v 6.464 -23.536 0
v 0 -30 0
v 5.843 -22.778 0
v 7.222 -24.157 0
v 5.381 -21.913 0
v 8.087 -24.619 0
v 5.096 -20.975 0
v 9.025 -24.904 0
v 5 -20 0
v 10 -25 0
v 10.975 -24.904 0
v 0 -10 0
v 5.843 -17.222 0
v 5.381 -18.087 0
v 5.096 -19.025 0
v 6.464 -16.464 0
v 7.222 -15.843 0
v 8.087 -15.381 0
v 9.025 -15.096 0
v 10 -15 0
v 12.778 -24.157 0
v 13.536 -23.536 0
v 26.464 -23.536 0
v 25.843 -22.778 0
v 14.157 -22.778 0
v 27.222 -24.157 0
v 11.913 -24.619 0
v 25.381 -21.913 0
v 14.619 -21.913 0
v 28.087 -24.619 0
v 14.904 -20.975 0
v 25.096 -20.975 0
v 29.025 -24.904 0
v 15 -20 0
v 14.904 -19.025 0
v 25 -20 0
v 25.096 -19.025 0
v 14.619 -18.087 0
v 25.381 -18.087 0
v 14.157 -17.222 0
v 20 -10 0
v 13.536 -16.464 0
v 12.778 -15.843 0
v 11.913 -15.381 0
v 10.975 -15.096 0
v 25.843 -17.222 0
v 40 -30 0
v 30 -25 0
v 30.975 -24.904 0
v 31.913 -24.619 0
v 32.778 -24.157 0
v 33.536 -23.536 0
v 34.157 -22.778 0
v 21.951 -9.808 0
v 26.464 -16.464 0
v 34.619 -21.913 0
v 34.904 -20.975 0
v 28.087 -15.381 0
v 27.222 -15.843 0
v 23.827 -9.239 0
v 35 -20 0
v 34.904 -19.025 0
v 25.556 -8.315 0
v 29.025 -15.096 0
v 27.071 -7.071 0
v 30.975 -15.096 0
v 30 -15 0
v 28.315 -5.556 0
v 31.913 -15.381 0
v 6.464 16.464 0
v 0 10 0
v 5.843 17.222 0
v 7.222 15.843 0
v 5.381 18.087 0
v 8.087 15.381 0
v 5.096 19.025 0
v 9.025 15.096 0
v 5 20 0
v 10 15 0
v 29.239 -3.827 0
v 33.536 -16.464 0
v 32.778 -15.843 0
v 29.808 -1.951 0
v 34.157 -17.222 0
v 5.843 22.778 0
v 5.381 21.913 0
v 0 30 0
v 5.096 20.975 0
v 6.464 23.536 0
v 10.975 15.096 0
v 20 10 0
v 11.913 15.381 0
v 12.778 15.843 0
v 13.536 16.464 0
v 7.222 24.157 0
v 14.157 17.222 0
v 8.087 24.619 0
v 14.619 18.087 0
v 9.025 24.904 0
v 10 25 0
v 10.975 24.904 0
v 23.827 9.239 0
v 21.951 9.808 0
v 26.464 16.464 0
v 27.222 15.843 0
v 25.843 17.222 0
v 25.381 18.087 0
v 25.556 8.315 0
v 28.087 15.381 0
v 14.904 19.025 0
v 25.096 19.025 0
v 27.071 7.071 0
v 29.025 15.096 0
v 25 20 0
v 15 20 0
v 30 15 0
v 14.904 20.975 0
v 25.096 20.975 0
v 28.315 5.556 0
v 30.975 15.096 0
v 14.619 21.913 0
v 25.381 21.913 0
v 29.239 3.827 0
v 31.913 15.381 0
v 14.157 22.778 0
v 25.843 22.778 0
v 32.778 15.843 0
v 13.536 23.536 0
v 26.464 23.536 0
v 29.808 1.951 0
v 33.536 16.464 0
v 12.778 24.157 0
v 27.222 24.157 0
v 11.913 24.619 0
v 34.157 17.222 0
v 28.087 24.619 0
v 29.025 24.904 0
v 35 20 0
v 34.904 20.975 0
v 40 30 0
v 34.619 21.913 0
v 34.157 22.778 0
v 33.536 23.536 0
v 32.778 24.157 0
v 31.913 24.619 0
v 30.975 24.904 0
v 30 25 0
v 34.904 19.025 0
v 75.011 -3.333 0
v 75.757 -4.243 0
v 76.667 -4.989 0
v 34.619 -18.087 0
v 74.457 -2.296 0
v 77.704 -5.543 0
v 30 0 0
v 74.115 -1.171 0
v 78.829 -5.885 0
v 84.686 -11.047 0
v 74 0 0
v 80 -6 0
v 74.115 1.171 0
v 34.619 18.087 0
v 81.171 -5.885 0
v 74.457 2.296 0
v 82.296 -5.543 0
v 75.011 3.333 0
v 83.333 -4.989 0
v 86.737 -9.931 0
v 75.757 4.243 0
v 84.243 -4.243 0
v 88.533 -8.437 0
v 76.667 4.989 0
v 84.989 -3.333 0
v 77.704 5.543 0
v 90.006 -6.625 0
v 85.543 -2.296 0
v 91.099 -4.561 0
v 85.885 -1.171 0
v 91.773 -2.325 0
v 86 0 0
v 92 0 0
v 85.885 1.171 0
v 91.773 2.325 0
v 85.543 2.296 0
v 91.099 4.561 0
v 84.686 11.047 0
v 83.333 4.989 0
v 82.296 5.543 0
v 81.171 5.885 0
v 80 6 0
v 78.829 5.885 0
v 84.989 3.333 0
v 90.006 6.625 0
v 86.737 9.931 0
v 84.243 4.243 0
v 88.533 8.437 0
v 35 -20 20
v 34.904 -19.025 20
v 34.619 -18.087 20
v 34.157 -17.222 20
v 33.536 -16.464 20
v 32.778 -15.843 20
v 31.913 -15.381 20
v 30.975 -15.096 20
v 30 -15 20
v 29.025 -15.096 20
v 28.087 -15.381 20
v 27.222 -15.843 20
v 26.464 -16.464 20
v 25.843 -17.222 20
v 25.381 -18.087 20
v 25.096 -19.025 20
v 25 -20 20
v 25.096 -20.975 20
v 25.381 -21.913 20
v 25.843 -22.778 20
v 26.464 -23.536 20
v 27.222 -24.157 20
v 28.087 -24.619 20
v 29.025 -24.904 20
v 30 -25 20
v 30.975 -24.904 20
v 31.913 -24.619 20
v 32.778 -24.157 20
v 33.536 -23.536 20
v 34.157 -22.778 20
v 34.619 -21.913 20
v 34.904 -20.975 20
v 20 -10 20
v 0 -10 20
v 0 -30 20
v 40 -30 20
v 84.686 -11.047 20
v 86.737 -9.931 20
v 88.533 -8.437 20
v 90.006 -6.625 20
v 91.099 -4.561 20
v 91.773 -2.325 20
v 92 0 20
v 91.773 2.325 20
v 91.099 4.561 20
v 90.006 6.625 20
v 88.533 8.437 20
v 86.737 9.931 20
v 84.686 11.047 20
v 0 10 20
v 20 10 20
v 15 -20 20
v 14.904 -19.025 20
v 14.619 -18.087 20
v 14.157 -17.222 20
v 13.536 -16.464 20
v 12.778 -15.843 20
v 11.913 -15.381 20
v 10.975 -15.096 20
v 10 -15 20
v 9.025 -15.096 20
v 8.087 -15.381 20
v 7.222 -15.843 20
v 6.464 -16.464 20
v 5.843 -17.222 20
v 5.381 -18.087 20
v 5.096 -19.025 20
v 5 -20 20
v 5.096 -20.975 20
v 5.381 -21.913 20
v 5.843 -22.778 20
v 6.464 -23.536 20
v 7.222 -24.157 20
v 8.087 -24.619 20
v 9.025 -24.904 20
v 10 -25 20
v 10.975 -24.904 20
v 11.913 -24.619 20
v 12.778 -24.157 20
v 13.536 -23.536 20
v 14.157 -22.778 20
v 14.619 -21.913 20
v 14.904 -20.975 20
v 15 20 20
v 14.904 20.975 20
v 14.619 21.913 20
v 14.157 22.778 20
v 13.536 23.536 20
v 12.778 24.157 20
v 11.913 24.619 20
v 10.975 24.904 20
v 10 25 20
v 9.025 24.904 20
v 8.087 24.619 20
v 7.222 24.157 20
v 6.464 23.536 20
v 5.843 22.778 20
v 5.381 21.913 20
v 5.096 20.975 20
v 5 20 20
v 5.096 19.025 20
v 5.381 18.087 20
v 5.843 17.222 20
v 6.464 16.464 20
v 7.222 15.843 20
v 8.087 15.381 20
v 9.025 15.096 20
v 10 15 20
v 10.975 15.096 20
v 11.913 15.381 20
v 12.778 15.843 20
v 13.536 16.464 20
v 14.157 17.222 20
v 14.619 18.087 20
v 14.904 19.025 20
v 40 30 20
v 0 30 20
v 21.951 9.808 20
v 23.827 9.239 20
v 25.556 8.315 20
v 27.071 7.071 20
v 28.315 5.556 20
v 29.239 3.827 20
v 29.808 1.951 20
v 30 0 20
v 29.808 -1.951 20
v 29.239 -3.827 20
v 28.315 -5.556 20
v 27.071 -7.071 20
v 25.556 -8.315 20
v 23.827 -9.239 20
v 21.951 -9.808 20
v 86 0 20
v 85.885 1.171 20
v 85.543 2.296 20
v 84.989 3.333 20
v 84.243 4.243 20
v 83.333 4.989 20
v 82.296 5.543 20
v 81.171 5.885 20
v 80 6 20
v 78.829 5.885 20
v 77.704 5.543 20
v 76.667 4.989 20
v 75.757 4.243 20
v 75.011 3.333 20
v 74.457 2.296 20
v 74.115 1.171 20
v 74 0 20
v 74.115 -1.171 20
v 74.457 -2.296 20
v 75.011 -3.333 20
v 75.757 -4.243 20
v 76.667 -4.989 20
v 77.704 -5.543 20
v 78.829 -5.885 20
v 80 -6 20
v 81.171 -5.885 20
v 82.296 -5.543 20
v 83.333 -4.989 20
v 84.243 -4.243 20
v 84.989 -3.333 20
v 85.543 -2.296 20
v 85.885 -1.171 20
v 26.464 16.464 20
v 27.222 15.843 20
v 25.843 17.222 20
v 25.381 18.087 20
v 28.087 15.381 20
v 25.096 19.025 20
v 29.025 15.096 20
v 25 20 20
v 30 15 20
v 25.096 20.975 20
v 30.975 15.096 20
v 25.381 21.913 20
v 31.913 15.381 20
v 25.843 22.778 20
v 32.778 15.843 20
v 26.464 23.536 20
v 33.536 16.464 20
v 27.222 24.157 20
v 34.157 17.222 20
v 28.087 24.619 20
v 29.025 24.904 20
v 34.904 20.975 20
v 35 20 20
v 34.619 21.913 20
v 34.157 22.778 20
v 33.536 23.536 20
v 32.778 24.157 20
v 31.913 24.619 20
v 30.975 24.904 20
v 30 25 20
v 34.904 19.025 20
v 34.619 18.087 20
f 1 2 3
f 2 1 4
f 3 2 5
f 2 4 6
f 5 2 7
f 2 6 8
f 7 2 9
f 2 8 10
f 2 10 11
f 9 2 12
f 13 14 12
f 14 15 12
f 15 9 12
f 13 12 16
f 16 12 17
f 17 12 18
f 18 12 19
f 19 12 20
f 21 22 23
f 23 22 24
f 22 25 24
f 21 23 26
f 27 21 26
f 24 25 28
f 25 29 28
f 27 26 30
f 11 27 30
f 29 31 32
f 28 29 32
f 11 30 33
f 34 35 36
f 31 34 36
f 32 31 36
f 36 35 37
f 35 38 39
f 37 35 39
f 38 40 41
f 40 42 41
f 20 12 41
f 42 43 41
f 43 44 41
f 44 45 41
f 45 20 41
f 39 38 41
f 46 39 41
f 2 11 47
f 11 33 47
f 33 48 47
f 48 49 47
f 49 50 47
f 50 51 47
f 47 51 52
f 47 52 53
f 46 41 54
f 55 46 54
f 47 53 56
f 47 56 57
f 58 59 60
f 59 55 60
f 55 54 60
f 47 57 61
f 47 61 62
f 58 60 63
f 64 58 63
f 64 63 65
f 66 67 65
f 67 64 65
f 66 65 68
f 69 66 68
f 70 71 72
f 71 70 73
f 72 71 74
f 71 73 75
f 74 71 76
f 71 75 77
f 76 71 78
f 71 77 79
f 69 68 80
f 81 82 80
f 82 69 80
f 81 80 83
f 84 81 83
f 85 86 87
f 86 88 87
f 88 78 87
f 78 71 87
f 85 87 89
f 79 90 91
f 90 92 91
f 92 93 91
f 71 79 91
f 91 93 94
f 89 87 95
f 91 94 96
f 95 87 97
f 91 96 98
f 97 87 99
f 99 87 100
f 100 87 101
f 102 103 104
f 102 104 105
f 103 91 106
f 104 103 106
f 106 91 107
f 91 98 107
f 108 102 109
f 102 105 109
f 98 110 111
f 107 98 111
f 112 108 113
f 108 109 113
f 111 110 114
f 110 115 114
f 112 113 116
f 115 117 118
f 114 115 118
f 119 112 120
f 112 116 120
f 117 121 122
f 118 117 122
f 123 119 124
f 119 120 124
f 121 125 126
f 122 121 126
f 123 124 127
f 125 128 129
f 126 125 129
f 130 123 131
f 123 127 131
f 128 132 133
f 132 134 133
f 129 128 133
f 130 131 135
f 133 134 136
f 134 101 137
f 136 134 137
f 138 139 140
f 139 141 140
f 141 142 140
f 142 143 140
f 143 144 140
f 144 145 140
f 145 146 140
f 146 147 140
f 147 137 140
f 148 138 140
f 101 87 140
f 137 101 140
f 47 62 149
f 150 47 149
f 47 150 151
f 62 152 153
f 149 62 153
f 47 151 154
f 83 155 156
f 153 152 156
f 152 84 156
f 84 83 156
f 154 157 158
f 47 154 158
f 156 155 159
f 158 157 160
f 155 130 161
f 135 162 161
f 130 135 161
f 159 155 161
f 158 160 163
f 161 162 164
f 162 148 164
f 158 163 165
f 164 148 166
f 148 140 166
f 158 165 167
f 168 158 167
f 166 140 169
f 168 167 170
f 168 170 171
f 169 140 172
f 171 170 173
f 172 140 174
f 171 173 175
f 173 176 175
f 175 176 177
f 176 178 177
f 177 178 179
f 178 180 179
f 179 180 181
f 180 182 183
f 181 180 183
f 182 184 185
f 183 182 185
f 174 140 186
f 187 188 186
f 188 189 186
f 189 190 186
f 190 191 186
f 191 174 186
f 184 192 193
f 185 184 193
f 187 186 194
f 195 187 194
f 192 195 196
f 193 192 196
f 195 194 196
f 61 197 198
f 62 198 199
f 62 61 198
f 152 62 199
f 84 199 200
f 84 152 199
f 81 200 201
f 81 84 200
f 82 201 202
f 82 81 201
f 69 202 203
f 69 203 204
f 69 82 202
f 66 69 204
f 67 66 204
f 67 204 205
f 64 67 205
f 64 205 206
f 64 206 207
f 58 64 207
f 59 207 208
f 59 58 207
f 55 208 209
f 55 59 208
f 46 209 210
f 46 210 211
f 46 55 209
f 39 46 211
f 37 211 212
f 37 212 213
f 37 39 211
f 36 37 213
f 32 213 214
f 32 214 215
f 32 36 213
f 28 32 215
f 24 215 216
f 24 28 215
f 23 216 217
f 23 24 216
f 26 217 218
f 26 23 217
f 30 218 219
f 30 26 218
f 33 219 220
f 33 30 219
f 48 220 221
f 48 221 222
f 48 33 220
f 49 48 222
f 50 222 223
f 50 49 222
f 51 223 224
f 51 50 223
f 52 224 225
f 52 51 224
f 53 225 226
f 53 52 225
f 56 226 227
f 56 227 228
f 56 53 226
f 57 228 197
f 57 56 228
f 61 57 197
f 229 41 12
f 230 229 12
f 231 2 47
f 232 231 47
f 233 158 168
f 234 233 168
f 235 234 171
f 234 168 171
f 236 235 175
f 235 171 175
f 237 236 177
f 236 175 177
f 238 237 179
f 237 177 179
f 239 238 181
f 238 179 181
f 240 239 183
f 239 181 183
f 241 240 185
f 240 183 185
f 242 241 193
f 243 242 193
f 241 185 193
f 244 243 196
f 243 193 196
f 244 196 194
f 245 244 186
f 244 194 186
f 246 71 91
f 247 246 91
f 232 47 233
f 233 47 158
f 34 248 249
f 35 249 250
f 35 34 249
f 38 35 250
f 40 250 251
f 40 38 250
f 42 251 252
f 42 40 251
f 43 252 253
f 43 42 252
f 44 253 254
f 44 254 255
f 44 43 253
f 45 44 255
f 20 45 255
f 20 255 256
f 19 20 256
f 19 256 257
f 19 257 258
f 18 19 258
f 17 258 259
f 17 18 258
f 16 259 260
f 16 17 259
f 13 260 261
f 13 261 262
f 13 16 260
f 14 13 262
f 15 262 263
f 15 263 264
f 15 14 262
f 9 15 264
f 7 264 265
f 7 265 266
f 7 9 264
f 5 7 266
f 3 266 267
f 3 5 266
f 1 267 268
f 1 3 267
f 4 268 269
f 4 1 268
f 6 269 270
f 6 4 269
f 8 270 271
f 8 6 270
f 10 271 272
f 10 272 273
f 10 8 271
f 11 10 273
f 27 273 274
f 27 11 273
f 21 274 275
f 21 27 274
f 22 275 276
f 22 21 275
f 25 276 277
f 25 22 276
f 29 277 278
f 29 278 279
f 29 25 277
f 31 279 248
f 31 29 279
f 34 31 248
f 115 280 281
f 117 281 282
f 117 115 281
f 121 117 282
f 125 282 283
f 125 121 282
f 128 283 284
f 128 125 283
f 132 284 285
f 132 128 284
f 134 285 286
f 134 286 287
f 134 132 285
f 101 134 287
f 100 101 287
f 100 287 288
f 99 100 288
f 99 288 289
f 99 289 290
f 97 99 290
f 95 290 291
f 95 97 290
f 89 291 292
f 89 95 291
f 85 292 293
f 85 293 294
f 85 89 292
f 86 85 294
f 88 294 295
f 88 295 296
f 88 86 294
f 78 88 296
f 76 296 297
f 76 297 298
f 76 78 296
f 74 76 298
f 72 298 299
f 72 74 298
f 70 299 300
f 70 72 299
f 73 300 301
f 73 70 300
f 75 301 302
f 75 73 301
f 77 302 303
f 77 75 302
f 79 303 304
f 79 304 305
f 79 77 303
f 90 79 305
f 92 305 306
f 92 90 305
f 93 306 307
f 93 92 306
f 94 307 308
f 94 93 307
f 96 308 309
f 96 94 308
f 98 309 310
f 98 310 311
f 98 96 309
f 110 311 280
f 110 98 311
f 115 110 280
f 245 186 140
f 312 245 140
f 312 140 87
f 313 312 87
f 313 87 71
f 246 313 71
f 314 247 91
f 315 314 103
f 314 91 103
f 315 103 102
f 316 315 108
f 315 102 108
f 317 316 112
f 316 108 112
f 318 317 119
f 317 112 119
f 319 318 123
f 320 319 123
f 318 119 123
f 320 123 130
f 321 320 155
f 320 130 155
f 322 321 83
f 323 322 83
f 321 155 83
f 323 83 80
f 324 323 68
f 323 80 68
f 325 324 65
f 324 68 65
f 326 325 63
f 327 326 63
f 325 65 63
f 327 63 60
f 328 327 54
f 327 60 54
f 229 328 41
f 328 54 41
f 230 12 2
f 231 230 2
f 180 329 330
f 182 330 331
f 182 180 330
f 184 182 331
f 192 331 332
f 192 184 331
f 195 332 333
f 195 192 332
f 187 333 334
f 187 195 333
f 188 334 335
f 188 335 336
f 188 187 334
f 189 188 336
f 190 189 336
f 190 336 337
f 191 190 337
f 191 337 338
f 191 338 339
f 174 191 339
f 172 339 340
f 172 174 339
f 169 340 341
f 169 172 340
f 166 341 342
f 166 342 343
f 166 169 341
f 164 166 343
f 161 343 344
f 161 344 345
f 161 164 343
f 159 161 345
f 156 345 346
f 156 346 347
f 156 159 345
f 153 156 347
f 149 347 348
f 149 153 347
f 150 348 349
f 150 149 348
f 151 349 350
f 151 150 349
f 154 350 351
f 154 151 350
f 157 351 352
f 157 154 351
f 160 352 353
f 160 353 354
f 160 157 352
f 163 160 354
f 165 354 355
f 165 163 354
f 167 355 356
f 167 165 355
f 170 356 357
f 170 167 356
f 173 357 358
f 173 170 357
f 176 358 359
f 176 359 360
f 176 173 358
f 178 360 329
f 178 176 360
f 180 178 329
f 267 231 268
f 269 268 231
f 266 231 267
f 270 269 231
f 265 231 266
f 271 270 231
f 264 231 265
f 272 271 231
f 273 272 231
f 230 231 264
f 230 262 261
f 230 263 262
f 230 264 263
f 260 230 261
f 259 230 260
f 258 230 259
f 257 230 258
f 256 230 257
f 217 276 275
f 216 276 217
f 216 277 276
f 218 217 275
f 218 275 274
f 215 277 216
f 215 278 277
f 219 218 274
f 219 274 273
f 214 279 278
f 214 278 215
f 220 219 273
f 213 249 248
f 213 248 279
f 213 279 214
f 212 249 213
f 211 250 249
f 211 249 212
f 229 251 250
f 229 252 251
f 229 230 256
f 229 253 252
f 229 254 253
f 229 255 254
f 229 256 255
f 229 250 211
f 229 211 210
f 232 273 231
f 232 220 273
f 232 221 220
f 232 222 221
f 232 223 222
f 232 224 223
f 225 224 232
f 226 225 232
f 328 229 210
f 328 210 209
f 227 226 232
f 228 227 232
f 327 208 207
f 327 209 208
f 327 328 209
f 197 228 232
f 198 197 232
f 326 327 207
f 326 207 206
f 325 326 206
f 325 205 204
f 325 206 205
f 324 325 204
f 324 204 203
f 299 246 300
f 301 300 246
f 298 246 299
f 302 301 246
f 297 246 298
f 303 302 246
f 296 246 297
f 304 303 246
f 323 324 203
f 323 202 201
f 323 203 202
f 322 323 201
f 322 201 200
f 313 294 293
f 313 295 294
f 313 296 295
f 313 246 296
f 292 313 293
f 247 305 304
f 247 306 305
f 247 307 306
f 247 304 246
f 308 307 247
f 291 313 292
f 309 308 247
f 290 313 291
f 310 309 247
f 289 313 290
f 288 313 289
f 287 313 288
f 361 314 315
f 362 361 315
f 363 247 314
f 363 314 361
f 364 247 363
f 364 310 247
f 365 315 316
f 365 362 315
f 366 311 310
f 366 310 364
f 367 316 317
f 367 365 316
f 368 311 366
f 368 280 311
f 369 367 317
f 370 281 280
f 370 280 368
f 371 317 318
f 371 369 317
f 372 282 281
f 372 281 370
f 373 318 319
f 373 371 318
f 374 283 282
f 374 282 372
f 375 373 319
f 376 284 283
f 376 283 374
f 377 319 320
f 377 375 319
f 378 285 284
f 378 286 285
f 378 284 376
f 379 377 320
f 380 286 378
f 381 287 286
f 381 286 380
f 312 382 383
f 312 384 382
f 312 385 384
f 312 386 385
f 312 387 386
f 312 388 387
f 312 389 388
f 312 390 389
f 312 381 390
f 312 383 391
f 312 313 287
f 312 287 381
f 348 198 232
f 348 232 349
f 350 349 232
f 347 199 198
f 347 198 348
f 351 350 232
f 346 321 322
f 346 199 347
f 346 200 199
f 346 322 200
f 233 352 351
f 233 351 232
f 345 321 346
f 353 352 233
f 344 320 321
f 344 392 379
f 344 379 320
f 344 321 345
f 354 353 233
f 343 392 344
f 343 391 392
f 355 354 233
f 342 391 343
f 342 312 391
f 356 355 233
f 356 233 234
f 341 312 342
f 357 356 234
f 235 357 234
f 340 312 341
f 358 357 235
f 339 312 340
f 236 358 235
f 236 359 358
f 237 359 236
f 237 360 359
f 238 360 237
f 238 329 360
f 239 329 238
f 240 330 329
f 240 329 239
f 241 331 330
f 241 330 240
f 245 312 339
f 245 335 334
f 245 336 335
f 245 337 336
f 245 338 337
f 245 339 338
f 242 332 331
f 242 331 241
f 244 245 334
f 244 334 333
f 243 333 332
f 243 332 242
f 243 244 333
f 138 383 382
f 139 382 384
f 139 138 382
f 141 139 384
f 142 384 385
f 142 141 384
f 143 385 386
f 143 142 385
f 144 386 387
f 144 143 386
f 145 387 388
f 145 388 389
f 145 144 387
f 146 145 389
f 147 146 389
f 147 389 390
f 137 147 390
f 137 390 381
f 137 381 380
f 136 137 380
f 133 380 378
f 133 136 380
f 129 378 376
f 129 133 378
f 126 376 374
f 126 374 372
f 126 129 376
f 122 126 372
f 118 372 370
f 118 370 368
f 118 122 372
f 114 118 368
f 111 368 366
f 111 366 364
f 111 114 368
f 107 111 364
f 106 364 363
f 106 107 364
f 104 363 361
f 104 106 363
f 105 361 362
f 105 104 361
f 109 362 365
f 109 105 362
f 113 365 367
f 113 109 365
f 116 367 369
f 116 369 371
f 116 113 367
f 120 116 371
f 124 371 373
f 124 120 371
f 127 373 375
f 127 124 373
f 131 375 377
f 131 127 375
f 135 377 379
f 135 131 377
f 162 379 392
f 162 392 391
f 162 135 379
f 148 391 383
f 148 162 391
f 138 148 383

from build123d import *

# Parameters (mm, degrees)
SKETCH1_R           = 6
SKETCH1_R_2         = 5
BOSS_EXTRUDE1_DEPTH = 20


with BuildPart() as part:
    # Sketch1 → Boss-Extrude1 (new body)
    with BuildSketch(Plane.XY):
        with BuildLine():
            Line((0, 10), (20, 10))
            ThreePointArc((20, 10), (30, 0), (20, -10))
            Line((20, -10), (0, -10))
            Line((0, -10), (0, -30))
            Line((0, -30), (40, -30))
            Line((40, -30), (84.685564793, -11.047419724))
            ThreePointArc((84.685564793, -11.047419724), (92, 0), (84.685564793, 11.047419724))
            Line((84.685564793, 11.047419724), (40, 30))
            Line((40, 30), (0, 30))
            Line((0, 30), (0, 10))
        make_face()
        with Locations((80, 0)):
            Circle(SKETCH1_R, mode=Mode.SUBTRACT)
        with Locations((10, 20)):
            Circle(SKETCH1_R_2, mode=Mode.SUBTRACT)
        with Locations((30, 20)):
            Circle(SKETCH1_R_2, mode=Mode.SUBTRACT)
        with Locations((30, -20)):
            Circle(SKETCH1_R_2, mode=Mode.SUBTRACT)
        with Locations((10, -20)):
            Circle(SKETCH1_R_2, mode=Mode.SUBTRACT)
    extrude(amount=BOSS_EXTRUDE1_DEPTH)


solid = part.part
